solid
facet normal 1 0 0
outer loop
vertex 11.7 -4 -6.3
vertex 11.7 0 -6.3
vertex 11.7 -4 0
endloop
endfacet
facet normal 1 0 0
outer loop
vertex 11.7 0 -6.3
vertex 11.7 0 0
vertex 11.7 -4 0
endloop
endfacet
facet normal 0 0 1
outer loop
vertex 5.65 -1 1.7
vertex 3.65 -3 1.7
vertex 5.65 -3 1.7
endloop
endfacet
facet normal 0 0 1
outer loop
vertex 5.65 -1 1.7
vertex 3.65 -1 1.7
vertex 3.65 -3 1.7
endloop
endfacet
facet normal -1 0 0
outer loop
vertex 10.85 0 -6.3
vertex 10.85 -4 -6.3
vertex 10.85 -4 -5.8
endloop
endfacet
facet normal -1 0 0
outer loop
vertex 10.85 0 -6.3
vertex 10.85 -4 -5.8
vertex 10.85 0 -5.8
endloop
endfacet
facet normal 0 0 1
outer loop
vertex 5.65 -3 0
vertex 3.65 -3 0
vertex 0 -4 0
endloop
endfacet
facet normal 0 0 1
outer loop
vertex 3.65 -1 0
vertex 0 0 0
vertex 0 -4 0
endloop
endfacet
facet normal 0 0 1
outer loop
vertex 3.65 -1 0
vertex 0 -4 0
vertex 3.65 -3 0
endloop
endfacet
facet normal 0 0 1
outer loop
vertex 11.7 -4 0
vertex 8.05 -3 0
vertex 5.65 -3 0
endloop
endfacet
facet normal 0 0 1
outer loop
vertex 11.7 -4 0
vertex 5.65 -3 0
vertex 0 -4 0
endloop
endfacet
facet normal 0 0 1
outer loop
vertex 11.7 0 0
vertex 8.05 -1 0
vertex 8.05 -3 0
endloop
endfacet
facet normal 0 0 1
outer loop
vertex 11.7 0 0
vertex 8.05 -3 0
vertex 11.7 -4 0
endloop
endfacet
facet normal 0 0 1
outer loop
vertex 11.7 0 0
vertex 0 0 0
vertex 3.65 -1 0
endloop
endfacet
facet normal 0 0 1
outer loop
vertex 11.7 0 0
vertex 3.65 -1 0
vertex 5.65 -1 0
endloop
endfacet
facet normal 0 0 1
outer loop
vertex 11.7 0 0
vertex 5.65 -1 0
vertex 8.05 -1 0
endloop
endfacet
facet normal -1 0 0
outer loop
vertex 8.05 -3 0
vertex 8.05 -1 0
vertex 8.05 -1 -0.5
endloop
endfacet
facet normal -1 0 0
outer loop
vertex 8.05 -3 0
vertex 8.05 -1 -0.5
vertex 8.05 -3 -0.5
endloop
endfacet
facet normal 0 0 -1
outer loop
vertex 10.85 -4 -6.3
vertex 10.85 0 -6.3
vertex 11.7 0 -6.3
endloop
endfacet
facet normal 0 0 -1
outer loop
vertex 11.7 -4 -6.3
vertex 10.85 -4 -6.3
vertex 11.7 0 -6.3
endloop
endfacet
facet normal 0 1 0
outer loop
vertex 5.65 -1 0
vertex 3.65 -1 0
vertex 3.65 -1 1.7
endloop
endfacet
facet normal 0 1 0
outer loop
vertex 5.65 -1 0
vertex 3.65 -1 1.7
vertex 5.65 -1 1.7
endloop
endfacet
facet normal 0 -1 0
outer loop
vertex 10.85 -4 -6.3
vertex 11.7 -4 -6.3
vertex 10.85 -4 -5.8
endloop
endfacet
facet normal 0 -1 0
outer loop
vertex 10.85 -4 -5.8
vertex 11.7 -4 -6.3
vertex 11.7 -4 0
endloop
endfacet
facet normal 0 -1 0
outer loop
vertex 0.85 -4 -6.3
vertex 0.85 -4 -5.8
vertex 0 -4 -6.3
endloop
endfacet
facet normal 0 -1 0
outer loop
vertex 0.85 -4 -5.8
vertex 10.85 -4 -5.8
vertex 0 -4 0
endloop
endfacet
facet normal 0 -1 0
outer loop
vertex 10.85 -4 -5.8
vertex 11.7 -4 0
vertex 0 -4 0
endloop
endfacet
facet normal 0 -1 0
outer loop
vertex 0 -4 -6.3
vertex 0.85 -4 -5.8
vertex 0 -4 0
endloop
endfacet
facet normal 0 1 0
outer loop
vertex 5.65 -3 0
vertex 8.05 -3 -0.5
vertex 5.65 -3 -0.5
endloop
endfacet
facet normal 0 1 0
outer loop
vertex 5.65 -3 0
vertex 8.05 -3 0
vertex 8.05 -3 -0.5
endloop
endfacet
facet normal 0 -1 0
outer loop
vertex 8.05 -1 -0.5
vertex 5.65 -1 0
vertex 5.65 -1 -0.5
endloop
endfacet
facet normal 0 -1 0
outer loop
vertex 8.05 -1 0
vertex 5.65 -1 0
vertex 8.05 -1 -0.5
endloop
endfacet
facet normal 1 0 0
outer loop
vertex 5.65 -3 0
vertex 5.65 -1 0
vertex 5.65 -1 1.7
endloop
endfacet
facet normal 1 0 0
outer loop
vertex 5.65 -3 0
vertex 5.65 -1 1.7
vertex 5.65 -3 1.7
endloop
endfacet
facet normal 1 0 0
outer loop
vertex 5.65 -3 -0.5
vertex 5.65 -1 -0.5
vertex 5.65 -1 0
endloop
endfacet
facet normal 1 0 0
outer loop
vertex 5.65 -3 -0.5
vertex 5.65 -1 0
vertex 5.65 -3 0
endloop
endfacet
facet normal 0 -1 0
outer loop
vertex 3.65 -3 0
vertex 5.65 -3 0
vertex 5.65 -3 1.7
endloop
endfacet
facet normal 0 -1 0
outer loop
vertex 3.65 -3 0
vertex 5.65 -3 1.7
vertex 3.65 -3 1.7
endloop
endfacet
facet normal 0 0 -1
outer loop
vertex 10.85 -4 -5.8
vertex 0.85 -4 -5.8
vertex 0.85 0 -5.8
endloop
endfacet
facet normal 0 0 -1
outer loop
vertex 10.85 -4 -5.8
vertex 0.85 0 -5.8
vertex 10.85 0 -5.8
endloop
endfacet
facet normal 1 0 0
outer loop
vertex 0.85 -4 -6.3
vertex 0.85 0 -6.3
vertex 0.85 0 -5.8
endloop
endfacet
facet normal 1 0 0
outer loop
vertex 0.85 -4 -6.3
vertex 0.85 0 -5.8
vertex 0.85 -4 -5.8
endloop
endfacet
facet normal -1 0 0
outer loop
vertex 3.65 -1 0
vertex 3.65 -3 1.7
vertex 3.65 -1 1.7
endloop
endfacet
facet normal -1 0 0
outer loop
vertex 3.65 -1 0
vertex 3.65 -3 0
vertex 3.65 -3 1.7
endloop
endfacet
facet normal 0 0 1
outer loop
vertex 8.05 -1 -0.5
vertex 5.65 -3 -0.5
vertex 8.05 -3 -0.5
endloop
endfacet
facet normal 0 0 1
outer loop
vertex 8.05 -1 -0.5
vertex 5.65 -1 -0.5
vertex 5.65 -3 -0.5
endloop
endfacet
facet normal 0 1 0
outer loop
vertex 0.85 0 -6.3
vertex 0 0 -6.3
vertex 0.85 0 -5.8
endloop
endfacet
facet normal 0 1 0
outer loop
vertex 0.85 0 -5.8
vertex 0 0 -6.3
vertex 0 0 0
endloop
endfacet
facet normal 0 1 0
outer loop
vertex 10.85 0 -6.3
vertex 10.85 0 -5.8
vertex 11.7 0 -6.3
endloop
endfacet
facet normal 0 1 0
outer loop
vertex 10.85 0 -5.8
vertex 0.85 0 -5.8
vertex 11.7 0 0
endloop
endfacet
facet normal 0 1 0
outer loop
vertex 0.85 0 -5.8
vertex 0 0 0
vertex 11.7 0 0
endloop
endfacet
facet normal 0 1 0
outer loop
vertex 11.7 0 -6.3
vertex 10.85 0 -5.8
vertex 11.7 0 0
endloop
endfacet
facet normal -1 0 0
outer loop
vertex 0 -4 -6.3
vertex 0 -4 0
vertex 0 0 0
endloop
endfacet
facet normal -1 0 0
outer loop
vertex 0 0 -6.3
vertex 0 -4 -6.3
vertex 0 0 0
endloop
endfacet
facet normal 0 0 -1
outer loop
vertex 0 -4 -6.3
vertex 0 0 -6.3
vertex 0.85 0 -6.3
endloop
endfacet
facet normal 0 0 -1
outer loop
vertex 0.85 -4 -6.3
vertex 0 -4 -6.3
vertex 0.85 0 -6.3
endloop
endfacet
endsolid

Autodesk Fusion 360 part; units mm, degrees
sketch "Sketch1" plane through (0, 0, 0) normal (0, 0, 1) x (1, 0, 0)
  line L0 (0, 0) -> (11.7, 0)
  line L1 (11.7, 0) -> (11.7, -4)
  line L2 (11.7, -4) -> (0, -4)
  line L3 (0, -4) -> (0, 0)
  line L4 (5.85, 0) -> (5.85, -4) construction
  line L5 (0, -2) -> (11.7, -2) construction
  line L6 (8.05, -3) -> (3.65, -3)
  line L7 (3.65, -3) -> (3.65, -1)
  line L8 (3.65, -1) -> (8.05, -1)
  line L9 (8.05, -1) -> (8.05, -3)
  line L10 (8.05, -3) -> (3.65, -1) construction
  line L11 (3.65, -3) -> (8.05, -1) construction
  line L12 (3.65, -1) -> (5.65, -1)
  line L13 (5.65, -1) -> (5.65, -3)
  line L14 (5.65, -3) -> (3.65, -3)
  line L15 (3.65, -3) -> (3.65, -1)
  point P0 (5.85, -2)
  dimension "d1" = 11.7
  dimension "d2" = 4
  dimension "d3" = 4.4
  dimension "d4" = 2
  dimension "d5" = 2
extrude "Extrude1" add sketch "Sketch1" against normal blind 6.3 contours L0 L1 L2 L3 | L6 L8 L9 L13 | L6 L7 L8 L12 L13 L14 L15
extrude "Extrude2" cut sketch "Sketch1" against normal blind 0.5 contours L6 L8 L9 L13 | L6 L7 L8 L12 L13 L14 L15
extrude "Extrude3" add sketch "Sketch1" along normal blind 1.7 and the other way blind 0.5 contours L6 L7 L8 L12 L13 L14 L15
sketch "Sketch2" plane through (0, 0, -6.3) normal (0, 0, -1) x (1, 0, 0)
  line L0 (11.7, 4) -> (0, 4)
  line L1 (0, 4) -> (0, 0)
  line L2 (0, 0) -> (11.7, 0)
  line L3 (11.7, 0) -> (11.7, 4)
  line L4 (5.85, 4) -> (5.85, 0) construction
  line L5 (0, 2) -> (11.7, 2) construction
  line L6 (10.85, 0) -> (0.85, 0)
  line L7 (0.85, 0) -> (0.85, 4)
  line L8 (0.85, 4) -> (10.85, 4)
  line L9 (10.85, 4) -> (10.85, 0)
  line L10 (10.85, 0) -> (0.85, 4) construction
  line L11 (0.85, 0) -> (10.85, 4) construction
  point P0 (5.85, 2)
  dimension "d13" = 10
  dimension "d14" = 4
extrude "Extrude4" cut sketch "Sketch2" against normal blind 0.5 contours L0 L2 L6 L7 L8 L9
